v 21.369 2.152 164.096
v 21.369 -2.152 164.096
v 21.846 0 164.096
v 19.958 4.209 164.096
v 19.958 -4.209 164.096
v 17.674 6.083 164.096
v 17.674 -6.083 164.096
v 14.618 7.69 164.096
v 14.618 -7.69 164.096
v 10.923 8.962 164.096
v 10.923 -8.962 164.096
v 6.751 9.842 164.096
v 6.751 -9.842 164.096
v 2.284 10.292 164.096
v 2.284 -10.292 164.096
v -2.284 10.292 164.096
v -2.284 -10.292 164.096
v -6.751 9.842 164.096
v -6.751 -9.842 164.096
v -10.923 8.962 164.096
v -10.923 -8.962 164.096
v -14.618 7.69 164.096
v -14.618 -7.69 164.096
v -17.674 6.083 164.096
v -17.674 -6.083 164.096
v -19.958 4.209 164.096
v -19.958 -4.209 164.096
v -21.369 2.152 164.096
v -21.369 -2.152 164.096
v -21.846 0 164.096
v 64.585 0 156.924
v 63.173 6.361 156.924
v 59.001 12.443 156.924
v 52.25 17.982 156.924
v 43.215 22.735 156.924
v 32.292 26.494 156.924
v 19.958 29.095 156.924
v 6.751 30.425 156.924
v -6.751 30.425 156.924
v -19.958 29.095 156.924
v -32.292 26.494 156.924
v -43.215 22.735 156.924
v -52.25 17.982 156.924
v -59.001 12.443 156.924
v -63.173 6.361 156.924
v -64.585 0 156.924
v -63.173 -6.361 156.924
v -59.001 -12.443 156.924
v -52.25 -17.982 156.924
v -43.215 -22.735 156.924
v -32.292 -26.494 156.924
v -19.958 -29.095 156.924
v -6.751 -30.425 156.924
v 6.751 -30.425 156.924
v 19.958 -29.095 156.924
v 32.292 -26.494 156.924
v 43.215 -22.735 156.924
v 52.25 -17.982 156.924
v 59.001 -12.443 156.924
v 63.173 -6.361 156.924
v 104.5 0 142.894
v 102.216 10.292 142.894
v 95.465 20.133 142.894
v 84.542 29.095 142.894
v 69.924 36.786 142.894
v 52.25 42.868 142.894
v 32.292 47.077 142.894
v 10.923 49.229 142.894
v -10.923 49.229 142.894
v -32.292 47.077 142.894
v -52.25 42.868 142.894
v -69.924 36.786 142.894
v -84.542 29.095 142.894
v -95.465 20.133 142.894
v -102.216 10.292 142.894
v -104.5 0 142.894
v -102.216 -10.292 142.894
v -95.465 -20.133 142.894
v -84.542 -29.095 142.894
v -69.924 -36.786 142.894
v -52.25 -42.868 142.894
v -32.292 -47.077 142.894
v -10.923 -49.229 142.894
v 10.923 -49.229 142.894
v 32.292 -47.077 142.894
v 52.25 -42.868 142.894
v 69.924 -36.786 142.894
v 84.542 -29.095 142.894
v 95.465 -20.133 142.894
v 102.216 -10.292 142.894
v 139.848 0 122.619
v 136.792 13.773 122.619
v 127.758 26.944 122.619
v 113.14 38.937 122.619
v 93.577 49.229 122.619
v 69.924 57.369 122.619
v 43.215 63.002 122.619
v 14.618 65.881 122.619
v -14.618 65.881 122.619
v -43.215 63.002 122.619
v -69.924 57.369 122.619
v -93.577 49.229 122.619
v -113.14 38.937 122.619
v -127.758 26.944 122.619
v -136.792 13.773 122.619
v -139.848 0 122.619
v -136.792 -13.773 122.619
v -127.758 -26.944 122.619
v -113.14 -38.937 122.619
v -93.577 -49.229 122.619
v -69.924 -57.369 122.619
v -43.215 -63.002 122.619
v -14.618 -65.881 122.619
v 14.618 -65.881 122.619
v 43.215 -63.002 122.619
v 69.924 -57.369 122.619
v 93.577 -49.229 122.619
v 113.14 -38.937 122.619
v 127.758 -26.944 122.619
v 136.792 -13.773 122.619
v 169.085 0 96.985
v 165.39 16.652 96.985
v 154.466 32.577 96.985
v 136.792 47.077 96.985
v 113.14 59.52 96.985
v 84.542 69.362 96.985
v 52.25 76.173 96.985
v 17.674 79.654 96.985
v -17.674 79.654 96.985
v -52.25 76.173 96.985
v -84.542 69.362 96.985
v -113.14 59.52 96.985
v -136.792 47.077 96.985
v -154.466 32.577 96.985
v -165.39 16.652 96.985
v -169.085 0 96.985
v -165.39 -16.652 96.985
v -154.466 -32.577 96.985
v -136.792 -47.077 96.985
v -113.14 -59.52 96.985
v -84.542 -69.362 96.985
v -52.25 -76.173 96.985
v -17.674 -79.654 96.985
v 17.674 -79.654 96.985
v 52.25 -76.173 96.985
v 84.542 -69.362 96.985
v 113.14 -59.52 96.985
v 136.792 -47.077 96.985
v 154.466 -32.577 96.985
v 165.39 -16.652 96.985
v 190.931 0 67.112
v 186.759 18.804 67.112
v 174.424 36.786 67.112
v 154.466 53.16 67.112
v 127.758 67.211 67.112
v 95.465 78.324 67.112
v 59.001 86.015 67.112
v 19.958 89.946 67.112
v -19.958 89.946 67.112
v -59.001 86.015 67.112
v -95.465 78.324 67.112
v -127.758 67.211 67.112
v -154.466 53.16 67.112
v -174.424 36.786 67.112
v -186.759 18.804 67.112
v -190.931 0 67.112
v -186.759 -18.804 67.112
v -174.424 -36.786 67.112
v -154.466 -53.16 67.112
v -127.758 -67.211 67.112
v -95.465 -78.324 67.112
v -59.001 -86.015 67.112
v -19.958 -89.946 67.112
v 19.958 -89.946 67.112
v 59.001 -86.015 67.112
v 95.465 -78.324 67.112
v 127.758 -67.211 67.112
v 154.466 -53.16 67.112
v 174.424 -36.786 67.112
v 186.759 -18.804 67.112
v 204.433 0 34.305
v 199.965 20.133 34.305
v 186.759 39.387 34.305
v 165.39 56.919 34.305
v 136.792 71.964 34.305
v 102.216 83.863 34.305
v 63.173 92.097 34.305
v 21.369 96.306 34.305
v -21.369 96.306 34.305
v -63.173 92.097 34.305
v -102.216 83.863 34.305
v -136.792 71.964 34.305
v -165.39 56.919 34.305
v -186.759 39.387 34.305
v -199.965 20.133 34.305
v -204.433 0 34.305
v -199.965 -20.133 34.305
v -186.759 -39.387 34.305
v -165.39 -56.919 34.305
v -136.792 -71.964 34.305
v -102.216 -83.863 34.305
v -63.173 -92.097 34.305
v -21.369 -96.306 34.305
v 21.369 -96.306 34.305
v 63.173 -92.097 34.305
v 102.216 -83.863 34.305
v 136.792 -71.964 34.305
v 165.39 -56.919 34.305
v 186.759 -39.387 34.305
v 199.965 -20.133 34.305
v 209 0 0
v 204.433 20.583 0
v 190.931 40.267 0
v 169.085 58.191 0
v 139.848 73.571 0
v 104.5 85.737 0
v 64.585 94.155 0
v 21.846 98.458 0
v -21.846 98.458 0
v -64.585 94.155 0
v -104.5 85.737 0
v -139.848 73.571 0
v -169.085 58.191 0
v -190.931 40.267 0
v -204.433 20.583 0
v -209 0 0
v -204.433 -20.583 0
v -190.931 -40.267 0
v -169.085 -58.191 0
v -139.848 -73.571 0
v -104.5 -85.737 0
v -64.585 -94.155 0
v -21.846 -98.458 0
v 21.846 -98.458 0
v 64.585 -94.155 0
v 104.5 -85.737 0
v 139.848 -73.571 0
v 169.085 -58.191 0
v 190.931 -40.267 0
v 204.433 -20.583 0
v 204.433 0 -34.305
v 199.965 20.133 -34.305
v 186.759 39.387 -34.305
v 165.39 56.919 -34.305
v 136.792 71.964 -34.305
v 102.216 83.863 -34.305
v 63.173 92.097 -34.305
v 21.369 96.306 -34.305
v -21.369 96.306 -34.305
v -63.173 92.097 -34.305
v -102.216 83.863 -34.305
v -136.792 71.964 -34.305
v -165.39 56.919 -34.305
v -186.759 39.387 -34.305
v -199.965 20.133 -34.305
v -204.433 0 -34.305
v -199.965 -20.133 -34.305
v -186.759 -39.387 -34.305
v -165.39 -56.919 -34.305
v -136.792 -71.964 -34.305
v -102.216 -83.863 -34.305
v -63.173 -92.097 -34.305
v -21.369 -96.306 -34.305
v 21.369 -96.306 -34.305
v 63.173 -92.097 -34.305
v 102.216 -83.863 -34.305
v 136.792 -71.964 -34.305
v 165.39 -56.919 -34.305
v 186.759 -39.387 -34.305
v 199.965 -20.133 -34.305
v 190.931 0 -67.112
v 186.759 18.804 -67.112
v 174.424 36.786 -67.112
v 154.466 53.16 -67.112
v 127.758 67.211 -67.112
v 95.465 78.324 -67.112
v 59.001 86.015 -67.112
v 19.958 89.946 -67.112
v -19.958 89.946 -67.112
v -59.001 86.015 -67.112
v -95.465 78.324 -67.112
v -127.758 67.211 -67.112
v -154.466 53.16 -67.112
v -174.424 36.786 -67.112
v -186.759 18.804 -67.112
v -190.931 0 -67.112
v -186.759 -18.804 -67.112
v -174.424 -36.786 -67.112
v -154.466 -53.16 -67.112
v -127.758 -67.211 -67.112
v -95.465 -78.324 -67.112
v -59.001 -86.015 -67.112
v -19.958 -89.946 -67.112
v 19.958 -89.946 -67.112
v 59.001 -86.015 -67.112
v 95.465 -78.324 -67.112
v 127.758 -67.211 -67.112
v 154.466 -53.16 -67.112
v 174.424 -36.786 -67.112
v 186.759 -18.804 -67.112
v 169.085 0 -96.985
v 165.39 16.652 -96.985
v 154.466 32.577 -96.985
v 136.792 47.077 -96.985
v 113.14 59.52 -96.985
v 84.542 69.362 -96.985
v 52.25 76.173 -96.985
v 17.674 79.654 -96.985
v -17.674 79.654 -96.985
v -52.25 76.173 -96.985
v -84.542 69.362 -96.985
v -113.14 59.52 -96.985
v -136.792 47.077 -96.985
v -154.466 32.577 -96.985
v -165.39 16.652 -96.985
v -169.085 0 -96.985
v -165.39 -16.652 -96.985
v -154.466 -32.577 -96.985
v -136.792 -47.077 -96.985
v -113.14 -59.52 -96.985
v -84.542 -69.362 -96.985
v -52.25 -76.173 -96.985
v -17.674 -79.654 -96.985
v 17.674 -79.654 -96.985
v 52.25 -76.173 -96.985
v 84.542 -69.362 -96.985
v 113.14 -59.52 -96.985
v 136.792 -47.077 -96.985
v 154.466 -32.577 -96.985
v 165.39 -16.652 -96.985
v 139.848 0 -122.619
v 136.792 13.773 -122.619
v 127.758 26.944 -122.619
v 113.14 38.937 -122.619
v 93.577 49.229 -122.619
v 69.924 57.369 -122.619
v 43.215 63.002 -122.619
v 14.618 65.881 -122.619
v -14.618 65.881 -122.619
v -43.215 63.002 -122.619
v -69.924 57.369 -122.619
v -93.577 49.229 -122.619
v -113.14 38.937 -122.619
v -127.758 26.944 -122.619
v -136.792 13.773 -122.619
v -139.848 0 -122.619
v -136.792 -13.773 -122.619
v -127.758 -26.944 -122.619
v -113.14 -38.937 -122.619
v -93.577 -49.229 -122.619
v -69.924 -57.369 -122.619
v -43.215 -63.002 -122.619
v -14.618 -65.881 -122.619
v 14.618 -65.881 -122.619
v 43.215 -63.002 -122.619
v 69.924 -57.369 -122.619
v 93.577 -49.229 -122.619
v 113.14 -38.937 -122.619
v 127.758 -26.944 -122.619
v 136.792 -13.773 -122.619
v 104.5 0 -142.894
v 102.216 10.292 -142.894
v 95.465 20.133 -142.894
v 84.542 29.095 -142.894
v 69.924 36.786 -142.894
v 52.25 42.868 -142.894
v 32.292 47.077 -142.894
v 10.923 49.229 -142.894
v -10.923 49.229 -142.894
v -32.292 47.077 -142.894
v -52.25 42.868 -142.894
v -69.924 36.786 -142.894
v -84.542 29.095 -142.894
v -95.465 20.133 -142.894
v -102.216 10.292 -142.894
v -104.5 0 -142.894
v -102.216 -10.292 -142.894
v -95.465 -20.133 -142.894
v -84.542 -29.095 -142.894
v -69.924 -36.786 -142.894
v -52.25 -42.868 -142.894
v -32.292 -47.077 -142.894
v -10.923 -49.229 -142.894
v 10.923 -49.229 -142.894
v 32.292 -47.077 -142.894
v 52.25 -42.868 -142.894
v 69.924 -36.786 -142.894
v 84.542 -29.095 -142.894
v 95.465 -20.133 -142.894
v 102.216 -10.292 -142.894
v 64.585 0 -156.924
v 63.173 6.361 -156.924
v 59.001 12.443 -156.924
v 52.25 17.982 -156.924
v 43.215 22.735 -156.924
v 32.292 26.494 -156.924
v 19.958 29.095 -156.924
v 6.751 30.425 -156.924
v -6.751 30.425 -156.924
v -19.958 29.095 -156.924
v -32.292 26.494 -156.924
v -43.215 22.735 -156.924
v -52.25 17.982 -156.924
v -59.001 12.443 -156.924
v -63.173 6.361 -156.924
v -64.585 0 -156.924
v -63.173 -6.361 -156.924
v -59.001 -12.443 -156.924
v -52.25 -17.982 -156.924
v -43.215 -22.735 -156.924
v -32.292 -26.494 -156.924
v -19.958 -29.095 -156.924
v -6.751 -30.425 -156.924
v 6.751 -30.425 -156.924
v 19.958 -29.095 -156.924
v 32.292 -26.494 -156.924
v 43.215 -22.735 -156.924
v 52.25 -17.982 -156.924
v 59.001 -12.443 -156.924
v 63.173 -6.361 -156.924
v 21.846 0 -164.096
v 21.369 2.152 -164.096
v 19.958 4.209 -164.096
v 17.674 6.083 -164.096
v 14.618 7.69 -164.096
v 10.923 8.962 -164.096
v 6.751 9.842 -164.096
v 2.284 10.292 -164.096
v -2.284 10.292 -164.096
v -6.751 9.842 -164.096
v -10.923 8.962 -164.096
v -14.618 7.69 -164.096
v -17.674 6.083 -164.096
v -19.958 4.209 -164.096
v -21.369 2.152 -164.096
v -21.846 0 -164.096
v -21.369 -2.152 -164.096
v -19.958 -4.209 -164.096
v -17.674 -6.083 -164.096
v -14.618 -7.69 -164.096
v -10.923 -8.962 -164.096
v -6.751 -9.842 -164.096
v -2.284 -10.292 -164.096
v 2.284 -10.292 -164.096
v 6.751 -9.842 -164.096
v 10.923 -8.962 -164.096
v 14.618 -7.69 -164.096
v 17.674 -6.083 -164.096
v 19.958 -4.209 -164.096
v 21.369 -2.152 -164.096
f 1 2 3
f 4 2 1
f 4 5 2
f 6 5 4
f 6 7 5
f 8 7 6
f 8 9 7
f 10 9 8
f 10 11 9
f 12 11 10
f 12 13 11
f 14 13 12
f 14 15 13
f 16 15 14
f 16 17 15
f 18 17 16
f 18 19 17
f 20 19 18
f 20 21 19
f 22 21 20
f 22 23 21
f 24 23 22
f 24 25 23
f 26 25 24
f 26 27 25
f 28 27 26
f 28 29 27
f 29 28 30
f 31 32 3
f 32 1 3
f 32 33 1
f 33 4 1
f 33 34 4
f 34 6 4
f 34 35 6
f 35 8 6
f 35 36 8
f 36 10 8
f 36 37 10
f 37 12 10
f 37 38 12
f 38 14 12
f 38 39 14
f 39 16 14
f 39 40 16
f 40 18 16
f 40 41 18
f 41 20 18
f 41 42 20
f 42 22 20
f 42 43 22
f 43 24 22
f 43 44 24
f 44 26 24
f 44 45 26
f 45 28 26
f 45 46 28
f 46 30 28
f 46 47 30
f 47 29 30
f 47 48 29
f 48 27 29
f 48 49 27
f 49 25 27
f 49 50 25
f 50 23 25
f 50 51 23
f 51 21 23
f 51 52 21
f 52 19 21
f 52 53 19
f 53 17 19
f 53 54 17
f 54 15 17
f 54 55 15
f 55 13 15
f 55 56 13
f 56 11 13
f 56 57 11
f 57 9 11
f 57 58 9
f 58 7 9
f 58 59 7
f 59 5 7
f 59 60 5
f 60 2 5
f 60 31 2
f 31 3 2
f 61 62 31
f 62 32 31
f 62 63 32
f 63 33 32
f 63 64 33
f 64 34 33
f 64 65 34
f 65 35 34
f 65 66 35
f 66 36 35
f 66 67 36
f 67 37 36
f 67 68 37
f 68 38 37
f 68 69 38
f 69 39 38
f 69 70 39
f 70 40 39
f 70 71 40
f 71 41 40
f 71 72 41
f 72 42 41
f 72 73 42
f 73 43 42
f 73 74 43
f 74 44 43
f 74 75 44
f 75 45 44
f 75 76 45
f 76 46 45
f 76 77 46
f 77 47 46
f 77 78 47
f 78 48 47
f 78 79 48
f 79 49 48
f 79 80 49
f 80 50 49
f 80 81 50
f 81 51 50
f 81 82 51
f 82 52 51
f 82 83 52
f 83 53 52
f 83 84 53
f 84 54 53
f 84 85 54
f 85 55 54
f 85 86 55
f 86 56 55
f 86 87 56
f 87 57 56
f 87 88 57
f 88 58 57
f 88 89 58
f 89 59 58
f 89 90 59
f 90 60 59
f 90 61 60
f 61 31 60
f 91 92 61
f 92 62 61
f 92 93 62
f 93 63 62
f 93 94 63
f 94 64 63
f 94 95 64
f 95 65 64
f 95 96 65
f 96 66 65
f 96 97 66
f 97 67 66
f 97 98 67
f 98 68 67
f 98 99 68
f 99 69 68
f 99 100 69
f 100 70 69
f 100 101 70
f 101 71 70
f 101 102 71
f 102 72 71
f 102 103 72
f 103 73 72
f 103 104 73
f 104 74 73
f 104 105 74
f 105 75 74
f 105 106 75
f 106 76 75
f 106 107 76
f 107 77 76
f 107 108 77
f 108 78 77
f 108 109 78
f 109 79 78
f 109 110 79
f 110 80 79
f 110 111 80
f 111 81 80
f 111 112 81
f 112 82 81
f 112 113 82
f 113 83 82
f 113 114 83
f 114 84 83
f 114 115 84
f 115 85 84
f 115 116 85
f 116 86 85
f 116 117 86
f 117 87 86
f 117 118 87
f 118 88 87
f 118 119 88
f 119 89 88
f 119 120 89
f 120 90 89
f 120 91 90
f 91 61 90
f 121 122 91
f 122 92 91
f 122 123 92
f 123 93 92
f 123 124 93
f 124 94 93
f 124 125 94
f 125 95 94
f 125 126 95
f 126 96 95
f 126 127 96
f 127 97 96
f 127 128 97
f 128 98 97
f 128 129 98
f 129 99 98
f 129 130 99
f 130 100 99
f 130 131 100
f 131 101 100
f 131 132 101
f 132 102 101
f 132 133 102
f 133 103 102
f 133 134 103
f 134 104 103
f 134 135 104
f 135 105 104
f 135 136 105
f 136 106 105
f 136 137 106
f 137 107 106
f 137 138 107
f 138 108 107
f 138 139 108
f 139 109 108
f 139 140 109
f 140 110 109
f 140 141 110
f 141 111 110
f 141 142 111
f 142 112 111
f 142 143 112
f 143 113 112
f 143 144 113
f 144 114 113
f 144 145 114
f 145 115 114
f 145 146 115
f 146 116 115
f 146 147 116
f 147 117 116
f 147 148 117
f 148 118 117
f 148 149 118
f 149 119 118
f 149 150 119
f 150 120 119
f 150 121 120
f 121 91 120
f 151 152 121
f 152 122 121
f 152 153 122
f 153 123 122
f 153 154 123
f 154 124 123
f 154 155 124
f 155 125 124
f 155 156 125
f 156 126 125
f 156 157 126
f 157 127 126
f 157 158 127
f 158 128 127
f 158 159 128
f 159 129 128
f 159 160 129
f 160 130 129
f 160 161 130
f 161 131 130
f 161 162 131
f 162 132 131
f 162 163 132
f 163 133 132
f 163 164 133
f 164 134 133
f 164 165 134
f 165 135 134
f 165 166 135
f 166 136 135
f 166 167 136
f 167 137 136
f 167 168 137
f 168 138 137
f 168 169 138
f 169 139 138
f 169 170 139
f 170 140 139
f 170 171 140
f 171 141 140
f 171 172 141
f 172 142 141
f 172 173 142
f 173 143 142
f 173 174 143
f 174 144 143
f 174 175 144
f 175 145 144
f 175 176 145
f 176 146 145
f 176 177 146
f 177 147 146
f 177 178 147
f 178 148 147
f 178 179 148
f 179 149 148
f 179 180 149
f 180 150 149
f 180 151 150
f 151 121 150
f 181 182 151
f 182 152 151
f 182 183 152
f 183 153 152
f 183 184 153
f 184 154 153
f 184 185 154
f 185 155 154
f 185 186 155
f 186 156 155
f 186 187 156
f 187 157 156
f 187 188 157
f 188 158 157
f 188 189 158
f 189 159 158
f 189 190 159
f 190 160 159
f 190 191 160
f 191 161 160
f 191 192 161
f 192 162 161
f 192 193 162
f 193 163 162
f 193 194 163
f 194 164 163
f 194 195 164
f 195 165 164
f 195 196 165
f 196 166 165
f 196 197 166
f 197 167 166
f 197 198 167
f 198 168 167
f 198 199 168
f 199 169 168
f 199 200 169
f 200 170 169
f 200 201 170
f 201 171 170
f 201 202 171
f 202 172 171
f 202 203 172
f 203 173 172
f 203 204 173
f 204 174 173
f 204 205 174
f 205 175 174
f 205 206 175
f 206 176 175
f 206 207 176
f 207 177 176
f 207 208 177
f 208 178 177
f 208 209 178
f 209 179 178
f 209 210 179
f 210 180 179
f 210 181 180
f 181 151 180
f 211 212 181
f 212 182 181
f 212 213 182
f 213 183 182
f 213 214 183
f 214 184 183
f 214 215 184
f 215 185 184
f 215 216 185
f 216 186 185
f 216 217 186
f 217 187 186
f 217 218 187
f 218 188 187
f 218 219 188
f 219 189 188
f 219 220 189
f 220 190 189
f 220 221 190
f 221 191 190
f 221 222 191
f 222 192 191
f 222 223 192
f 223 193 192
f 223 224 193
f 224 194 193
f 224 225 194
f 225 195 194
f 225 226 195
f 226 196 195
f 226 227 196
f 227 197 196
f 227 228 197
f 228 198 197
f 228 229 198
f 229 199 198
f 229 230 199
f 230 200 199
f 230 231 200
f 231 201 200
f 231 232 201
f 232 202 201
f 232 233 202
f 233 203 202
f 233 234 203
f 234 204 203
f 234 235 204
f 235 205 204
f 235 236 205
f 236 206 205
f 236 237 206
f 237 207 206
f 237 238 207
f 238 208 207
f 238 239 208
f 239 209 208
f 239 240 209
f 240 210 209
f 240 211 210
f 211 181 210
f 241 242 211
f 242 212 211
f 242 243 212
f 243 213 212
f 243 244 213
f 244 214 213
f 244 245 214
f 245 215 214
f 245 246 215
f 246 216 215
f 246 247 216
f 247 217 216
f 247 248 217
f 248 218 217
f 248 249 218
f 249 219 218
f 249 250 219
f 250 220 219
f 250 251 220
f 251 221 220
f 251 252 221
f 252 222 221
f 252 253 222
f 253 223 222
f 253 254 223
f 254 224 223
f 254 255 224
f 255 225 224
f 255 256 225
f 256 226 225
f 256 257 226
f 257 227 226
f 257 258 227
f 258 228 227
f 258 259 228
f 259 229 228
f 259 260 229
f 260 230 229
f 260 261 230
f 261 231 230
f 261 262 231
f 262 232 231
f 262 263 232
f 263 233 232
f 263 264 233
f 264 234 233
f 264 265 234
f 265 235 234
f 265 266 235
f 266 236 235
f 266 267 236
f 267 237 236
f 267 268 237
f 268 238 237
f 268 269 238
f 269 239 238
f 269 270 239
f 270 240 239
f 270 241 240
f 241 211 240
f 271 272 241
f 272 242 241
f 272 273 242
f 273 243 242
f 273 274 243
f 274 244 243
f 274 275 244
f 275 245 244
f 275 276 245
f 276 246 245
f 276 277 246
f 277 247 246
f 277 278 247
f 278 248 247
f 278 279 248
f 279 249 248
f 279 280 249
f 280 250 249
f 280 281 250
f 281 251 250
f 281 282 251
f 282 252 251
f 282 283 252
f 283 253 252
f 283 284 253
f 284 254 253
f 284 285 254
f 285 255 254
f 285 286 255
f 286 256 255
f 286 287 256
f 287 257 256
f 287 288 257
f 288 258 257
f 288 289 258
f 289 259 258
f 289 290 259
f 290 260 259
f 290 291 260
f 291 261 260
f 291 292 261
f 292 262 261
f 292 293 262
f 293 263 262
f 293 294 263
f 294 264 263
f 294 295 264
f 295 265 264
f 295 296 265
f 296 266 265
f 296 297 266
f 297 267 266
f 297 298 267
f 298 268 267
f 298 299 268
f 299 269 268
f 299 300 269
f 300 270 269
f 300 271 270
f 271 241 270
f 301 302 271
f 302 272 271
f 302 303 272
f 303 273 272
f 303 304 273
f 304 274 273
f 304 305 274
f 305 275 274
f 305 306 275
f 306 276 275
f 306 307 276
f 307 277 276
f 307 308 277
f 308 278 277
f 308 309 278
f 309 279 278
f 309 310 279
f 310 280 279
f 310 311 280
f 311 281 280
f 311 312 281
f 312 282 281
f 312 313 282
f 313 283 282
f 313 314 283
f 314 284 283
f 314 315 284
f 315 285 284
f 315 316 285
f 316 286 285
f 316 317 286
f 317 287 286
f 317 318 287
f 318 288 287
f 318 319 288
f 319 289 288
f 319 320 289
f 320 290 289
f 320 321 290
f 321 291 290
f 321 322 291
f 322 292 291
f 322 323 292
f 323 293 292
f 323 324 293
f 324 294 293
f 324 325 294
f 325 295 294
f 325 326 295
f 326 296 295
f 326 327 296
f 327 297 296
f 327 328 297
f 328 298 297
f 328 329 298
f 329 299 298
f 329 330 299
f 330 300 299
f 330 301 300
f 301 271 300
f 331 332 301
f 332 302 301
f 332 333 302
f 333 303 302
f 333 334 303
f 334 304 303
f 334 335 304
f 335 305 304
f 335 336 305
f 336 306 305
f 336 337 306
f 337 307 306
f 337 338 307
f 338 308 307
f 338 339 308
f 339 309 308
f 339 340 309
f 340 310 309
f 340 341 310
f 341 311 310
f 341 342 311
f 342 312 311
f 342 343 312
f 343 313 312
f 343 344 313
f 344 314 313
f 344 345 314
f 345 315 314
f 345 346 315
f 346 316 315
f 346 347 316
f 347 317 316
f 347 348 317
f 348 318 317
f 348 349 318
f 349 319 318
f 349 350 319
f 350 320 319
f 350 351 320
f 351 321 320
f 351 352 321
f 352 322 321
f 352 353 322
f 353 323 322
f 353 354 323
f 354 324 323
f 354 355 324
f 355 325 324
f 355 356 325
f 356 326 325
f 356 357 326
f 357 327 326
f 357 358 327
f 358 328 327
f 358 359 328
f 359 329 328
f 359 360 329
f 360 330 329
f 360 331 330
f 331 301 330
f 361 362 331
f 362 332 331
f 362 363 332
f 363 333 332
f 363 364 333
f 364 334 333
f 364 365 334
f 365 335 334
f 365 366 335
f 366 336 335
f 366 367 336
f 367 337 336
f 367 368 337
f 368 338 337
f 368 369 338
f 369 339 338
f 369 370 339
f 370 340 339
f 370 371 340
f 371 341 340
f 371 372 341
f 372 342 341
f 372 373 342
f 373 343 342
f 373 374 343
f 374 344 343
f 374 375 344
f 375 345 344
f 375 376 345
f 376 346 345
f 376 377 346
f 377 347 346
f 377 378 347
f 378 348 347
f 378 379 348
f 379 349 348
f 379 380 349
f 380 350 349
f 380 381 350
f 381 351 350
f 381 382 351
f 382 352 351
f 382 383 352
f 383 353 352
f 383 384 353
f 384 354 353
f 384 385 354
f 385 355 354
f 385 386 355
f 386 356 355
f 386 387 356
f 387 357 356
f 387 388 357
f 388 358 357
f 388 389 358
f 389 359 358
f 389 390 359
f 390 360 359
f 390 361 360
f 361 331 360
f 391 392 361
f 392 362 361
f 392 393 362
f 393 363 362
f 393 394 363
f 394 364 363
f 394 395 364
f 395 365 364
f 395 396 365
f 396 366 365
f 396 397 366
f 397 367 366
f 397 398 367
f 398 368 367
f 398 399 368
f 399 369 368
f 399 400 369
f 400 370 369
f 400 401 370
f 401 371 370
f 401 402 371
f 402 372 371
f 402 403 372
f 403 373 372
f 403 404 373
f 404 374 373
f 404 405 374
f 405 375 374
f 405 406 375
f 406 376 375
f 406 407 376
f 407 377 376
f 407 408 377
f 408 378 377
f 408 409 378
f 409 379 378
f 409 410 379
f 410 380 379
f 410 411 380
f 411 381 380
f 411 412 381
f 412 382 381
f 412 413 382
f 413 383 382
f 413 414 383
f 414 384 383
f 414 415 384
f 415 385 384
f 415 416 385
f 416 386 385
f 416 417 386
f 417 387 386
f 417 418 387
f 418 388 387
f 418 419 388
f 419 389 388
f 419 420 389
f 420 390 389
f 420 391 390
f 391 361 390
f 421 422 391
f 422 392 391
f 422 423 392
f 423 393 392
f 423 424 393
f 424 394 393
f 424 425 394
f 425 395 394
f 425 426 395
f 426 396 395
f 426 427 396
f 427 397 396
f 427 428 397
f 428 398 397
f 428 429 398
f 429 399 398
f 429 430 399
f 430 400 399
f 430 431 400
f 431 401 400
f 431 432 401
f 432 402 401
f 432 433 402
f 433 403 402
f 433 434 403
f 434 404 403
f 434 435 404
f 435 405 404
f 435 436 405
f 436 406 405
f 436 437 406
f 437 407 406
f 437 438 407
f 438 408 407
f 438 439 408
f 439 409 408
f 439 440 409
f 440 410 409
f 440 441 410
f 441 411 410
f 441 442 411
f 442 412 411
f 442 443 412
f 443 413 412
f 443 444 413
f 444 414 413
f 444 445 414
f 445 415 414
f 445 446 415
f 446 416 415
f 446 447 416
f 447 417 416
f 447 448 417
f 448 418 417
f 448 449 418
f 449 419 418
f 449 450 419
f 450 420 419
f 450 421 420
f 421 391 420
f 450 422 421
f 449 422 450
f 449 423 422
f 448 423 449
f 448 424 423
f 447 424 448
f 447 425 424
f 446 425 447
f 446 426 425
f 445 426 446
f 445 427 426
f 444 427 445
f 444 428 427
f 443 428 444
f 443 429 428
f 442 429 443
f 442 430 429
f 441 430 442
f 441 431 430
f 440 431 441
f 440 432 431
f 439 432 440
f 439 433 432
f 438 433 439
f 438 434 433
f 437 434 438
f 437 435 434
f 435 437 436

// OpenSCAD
// Generated by SolidPython 1.0.1 on 2020-07-29 00:46:54


scale(v = [19, 9, 15]) {
	sphere(r = 11);
}
/***********************************************
*********      SolidPython code:      **********
************************************************
 
# import packages: SolidPython
from solid import *
from solid.utils import *
from itertools import chain, combinations, permutations


class Resize:

    def __init__(self, scad_file):
        self.scad_file = scad_file
        #self.scad_file = import_scad(scad_file)
        # cone/cylinder param:
        self.r1 = 0
        self.r2 = 0
        self.h = 0
        # rectangular prism param:
        self.w = 0
        self.l = 0
        # ellipse param:
        self.r = 0

    # import OpenScad code (file name corresponds to shape)


    # classify shape + parameters
    def assign(self, param1, param2, param3):
        if self.scad_file == 'cone.scad':
            self.r1 = param1
            self.r2 = param2
            self.h = param3
        elif self.scad_file == 'cylinder.scad':
            self.r1 = param1
            self.r2 = param2
            self.h = param3
        elif self.scad_file == 'rectangularPrism.scad':
            self.h = param1
            self.l = param2
            self.w = param3
        else:
            self.r = param1
            self.h = param2

    # resize parameters
    def iterate(self):
        x = range(3, 20, 2)
        i = 1
        if self.scad_file == 'cone.scad':
            tempList = list(permutations(x, 2))
            for temp in tempList:
                param1 = temp[0]
                param2 = temp[1]
                filepath = 'produced_scad_files/' + 'cone' + str(param1) + '_' + str(param2) + '_' + '.scad'
                scad_render_to_file(cylinder(h=param1, r1=param2, r2=0), filepath)

        elif self.scad_file == 'cylinder.scad':
            tempList = list(permutations(x, 3))
            for temp in tempList:
                param1 = temp[0]
                param2 = temp[1]
                filepath = 'produced_scad_files/' + 'cylinder' + str(param1) + '_' + str(param2) + '_' + '.scad'
                scad_render_to_file(cylinder(h=param1, r1=param2, r2=param2), filepath)

        elif self.scad_file == 'rectangularPrism.scad':
            tempList = list(permutations(x, 3))
            for temp in tempList:
                param1 = temp[0]
                param2 = temp[1]
                param3 = temp[2]
                filepath = 'produced_scad_files/' + 'rectangularPrism' + str(param1) + '_' + str(param2) + '_' + str(
                    param3) + '.scad'
                scad_render_to_file(cube(size=(param1, param2, param3)), filepath)

        elif self.scad_file == 'ellipse.scad':
            tempList = list(permutations(x, 4))
            for temp in tempList:
                param1 = temp[0]
                param2 = temp[1]
                param3 = temp[2]
                param4 = temp[3]
                filepath = 'produced_scad_files/' + 'ellipse' + str(param1) + '_' + str(param2) + '_' + str(param3) + '_' + str(param4) + '.scad'
                scad_render_to_file(scale([param1, param2, param3])(sphere(r=param4)), filepath)

    def render_to_scadfile(self):
        scad_render_to_file(scad, 'example.scad') 
 
************************************************/
